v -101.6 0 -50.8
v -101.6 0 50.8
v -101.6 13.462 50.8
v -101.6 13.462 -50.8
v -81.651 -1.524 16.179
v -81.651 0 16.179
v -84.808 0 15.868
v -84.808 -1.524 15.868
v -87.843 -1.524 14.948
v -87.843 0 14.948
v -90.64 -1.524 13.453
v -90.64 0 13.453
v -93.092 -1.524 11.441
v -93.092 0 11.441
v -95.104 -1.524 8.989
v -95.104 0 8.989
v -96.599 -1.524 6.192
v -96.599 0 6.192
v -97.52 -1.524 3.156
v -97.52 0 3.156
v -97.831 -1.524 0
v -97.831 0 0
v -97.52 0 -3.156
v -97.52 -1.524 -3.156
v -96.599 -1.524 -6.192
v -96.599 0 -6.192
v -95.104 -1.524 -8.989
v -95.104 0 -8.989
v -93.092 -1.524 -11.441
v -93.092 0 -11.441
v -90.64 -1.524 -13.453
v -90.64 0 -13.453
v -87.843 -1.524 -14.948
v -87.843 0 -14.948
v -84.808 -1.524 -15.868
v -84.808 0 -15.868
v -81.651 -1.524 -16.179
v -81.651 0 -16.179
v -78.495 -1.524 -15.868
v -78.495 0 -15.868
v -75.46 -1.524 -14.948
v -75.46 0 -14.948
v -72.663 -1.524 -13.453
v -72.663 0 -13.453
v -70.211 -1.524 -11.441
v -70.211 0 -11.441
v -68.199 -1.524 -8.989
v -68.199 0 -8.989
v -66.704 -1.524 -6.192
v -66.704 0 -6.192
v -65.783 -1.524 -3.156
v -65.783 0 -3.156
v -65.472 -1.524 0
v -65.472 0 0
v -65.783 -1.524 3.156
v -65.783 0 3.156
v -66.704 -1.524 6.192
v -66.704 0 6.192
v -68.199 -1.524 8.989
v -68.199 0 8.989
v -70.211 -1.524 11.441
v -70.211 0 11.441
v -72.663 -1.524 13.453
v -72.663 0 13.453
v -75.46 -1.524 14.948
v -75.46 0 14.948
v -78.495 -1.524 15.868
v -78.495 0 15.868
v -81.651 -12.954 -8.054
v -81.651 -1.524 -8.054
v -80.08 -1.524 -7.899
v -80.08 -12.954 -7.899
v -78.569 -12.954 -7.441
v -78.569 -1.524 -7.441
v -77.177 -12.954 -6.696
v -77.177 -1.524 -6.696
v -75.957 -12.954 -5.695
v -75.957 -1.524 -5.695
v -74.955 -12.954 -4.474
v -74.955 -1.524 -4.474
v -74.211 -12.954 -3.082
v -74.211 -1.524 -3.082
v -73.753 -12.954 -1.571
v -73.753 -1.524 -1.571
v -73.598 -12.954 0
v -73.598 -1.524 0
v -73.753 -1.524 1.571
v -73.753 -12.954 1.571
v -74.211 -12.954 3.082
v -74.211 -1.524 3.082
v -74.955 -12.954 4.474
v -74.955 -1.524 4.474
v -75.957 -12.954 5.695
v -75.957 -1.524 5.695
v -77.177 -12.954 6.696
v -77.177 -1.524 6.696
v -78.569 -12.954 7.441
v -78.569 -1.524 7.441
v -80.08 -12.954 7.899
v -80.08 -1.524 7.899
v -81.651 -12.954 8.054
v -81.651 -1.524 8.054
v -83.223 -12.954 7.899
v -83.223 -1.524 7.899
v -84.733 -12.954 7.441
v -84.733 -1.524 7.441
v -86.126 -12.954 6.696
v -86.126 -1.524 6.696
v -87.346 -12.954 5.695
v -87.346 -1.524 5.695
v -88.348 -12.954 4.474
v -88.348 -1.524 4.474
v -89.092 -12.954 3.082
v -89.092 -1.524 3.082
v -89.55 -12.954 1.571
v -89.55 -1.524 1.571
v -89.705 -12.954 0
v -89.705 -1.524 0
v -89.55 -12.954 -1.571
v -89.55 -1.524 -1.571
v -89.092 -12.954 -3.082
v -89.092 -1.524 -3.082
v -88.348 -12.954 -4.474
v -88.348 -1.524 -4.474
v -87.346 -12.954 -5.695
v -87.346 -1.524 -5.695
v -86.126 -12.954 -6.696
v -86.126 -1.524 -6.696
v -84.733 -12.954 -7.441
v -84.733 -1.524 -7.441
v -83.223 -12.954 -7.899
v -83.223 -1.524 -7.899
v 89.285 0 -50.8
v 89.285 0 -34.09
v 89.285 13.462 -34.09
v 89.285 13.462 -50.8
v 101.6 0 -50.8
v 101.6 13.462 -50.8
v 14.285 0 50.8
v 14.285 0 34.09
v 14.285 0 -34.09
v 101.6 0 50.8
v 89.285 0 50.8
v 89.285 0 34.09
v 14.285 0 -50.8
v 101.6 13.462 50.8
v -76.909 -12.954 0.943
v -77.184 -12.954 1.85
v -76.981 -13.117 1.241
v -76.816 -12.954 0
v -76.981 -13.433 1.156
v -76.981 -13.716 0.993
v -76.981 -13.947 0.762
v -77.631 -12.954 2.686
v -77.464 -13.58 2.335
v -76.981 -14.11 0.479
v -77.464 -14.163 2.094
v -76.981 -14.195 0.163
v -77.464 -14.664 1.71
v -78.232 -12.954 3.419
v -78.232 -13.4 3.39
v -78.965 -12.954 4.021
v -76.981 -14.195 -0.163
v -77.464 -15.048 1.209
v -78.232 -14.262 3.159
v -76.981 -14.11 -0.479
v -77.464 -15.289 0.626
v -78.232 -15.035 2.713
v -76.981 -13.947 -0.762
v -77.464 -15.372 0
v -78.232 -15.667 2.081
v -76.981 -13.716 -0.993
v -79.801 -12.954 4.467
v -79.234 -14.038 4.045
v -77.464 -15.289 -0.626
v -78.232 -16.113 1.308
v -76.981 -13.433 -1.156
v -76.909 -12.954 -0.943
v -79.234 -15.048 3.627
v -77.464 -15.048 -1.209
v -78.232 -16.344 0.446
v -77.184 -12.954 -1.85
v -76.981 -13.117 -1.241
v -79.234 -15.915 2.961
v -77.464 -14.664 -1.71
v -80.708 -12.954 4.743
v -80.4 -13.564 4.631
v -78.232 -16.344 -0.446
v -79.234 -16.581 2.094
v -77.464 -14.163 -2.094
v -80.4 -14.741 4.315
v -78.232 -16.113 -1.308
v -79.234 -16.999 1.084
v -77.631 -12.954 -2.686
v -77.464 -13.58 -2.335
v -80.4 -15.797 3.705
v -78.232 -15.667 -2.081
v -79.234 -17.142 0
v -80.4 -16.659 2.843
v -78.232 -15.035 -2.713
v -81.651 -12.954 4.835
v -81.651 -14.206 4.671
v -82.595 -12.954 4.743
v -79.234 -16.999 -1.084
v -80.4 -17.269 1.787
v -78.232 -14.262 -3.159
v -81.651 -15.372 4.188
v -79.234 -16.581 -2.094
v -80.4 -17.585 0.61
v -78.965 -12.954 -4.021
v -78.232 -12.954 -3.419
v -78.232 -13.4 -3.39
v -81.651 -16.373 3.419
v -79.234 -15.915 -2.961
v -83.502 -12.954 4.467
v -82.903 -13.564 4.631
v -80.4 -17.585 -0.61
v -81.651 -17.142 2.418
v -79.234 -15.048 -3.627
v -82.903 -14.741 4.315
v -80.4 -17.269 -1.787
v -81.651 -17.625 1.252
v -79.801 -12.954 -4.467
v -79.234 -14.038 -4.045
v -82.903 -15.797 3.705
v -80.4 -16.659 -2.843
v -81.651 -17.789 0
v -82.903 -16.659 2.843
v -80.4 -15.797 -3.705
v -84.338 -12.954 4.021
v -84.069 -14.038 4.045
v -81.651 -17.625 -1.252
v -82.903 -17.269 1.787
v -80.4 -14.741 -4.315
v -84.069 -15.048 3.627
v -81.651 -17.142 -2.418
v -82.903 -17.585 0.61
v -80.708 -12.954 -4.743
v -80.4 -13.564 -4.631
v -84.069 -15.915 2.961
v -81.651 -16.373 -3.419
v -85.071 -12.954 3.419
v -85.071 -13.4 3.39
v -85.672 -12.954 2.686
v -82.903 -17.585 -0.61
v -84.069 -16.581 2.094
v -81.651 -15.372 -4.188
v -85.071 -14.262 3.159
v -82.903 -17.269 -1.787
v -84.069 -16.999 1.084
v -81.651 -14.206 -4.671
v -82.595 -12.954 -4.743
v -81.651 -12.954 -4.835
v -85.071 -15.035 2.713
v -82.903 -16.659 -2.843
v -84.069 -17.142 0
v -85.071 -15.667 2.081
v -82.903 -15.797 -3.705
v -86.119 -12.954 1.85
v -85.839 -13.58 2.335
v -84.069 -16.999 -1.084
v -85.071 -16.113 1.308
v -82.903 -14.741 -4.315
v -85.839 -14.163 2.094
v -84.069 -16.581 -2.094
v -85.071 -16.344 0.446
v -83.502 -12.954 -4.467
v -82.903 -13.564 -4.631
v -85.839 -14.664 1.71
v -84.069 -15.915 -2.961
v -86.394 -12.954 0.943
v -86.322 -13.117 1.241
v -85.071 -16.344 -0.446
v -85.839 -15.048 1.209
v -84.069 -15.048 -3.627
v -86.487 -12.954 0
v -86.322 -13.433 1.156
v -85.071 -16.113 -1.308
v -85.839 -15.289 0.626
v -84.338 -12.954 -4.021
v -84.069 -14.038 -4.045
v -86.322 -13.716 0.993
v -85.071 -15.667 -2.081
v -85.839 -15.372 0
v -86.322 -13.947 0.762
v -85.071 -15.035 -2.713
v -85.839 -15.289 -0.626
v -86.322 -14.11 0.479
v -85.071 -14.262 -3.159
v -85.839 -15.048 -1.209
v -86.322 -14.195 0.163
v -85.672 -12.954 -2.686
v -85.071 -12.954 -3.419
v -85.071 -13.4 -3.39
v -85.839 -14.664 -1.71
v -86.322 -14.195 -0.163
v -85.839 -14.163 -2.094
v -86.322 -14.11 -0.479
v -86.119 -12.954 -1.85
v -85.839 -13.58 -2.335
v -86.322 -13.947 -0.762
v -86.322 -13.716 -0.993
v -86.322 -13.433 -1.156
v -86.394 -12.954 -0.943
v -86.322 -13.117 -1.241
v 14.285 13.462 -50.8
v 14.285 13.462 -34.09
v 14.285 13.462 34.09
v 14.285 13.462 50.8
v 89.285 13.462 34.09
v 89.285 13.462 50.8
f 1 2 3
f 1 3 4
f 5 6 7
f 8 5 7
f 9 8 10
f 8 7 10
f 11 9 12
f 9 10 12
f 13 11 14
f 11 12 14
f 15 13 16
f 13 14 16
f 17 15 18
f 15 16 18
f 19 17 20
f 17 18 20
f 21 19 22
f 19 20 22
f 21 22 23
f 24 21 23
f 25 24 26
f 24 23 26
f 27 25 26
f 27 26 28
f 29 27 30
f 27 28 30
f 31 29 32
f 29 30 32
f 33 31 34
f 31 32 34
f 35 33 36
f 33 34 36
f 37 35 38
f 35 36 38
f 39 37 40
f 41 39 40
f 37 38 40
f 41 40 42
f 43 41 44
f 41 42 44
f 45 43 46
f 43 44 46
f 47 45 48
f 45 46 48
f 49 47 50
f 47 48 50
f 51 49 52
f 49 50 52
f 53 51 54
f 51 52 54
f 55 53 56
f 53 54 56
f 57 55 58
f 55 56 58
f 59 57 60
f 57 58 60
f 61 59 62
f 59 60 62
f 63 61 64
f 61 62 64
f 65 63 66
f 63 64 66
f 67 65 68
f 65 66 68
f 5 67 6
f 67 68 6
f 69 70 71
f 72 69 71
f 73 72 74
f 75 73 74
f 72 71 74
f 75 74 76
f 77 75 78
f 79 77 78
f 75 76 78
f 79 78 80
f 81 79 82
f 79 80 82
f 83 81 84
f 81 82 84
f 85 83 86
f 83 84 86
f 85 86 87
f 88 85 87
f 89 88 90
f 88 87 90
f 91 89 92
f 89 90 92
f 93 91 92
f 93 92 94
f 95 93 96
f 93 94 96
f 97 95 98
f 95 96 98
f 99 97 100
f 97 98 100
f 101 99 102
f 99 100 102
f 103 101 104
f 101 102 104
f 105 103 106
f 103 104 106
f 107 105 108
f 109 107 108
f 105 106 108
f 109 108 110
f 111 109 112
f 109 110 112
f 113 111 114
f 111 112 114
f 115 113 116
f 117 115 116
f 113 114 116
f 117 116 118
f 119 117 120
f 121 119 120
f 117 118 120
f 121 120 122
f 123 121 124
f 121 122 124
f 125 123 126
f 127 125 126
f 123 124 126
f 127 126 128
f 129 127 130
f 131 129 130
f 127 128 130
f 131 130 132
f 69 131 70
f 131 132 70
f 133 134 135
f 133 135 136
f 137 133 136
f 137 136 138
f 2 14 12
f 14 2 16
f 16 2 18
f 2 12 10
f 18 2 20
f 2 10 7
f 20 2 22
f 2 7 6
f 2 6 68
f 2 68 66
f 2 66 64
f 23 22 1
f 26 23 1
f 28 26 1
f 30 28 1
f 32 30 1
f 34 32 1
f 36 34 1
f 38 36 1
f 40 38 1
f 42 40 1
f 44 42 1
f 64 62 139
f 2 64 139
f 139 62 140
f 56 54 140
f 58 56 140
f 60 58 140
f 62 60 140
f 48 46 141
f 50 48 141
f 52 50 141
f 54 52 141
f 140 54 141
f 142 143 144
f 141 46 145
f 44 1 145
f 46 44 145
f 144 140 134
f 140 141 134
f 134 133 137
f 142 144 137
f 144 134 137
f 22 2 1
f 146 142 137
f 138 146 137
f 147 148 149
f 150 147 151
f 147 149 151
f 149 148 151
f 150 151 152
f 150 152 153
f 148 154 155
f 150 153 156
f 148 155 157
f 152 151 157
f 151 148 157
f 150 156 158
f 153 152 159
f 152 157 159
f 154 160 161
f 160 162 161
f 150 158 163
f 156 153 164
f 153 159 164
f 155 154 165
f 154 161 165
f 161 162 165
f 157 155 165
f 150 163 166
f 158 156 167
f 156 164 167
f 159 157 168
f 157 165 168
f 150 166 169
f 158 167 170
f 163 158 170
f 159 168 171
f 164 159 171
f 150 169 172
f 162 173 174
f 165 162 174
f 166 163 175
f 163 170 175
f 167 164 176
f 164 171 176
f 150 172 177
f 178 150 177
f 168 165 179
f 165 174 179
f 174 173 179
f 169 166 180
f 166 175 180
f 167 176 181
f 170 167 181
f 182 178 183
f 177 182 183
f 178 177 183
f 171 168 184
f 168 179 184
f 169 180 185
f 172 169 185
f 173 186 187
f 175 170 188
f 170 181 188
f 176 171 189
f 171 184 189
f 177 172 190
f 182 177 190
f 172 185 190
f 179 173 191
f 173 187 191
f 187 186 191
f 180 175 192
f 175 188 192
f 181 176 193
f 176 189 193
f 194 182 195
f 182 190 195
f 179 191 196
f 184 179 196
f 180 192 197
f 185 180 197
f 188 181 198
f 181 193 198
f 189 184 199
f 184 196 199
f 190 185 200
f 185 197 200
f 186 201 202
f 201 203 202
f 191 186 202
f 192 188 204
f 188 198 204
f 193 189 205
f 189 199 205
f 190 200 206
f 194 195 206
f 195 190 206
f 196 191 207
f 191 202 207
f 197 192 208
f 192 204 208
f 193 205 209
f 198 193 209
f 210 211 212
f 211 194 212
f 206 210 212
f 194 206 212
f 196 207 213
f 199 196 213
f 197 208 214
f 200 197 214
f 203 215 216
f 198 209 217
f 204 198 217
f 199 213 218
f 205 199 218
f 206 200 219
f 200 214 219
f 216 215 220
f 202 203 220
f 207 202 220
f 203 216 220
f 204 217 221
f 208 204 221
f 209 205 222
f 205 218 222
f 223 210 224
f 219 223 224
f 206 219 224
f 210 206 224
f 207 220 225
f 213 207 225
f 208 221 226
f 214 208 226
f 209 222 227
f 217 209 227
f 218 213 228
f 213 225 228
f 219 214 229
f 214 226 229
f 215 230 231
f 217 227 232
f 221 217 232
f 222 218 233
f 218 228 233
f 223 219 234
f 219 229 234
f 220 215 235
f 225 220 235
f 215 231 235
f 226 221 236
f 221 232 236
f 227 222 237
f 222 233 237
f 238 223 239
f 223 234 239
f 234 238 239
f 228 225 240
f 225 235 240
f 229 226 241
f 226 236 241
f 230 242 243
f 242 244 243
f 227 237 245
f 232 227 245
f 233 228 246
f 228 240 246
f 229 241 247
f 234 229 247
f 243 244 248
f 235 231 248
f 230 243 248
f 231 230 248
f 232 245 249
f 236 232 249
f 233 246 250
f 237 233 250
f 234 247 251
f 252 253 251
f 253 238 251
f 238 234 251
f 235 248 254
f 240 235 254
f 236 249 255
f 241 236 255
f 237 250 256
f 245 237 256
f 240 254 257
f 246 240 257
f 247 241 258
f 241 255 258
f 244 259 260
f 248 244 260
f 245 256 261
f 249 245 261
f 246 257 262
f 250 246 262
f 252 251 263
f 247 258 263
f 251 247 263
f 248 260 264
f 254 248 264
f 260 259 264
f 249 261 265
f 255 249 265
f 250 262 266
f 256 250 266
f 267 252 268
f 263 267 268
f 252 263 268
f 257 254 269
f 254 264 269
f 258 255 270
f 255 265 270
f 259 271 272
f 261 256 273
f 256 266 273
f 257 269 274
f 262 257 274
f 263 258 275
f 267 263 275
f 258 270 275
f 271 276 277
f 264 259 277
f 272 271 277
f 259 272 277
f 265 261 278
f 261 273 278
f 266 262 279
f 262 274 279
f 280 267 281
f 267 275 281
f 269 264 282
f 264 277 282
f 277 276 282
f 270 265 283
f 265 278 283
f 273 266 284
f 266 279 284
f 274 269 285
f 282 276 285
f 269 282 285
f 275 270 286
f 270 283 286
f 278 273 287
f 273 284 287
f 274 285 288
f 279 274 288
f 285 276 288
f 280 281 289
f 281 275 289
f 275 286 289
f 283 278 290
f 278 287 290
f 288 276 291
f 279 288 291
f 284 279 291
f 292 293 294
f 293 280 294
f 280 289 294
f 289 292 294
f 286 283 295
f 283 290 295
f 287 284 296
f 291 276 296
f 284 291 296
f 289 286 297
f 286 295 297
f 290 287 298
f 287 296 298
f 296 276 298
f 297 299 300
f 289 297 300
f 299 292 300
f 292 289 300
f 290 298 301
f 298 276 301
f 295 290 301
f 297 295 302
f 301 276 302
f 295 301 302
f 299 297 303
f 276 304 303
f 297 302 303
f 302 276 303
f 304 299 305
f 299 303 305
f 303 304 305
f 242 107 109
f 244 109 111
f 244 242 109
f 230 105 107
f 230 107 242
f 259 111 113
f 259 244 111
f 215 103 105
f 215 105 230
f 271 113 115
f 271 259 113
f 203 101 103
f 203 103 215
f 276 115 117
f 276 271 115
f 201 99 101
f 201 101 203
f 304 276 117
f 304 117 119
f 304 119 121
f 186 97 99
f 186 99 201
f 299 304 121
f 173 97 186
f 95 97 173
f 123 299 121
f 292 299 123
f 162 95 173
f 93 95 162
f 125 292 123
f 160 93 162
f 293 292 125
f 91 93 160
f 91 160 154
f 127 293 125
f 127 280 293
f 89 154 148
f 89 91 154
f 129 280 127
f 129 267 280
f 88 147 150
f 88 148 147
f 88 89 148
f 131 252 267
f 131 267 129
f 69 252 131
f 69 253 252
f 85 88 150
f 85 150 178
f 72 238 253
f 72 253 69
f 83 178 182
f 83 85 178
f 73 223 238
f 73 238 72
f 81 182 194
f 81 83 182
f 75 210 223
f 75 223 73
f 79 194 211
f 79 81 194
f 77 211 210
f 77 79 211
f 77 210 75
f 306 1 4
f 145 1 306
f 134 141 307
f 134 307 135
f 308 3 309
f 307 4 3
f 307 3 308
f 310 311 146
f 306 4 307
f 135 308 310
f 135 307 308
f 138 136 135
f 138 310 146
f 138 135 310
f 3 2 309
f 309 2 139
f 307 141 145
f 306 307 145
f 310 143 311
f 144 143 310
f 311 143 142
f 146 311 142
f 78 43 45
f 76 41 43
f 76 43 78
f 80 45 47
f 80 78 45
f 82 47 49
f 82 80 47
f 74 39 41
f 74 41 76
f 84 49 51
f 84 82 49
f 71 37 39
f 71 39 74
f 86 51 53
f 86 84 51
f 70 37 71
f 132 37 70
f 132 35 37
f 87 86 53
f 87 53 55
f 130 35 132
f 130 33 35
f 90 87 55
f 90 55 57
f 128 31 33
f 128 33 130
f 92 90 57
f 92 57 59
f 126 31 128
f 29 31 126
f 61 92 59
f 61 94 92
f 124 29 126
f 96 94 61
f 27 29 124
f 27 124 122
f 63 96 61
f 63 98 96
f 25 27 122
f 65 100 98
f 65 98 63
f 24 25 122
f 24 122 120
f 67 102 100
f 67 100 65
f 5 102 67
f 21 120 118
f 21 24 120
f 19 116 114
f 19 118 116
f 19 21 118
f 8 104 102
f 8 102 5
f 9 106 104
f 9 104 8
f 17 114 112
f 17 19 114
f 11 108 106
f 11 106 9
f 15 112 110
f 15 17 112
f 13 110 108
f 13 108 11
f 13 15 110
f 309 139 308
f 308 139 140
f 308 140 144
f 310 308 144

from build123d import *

# Parameters (mm, degrees)
SKETCH1_W               = 203.2
SKETCH1_H               = 101.6
BOSS_EXTRUDE2_DEPTH     = 13.462
CUT_EXTRUDE1_DEPTH      = 13.208
CUT_EXTRUDE1_DEPTH_BACK = 28.448
SKETCH4_W               = 75
SKETCH4_H               = 23.376263875
SKETCH5_R               = 16.179381977
BOSS_EXTRUDE4_DEPTH     = 1.524
SKETCH6_R               = 8.05355352
BOSS_EXTRUDE6_DEPTH     = 11.43


with BuildPart() as part:
    # Sketch1 → Boss-Extrude2 (new body)
    with BuildSketch(Plane(origin=(0, 0, 0), x_dir=(1, 0, 0), z_dir=(0, 1, 0))):
        Rectangle(SKETCH1_W, SKETCH1_H)
    extrude(amount=BOSS_EXTRUDE2_DEPTH)

    # Sketch4 → Cut-Extrude1 (cut, two sides: drawn at the far end of the back side and taken through both)
    with BuildSketch(Plane(origin=(0, 13.462, 0), x_dir=(1, 0, 0), z_dir=(0, 1, 0)).offset(-CUT_EXTRUDE1_DEPTH_BACK)):
        with Locations((51.78549459, -45.778516755)):
            Rectangle(SKETCH4_W, SKETCH4_H)
        with Locations((51.78549459, 45.778516755)):
            Rectangle(SKETCH4_W, SKETCH4_H)
    extrude(amount=CUT_EXTRUDE1_DEPTH + CUT_EXTRUDE1_DEPTH_BACK, mode=Mode.SUBTRACT)

    # Sketch5 → Boss-Extrude4 (add)
    with BuildSketch(Plane(origin=(0, 0, 0), x_dir=(-1, 0, 0), z_dir=(0, -1, 0))):
        with Locations(Location((81.651405353, 0, 0), (0, 0, 270))):
            Circle(SKETCH5_R)
    extrude(amount=BOSS_EXTRUDE4_DEPTH)

    # Sketch6 → Boss-Extrude6 (add)
    with BuildSketch(Plane.XZ.offset(1.524)):
        with Locations(Location((-81.651405353, 0, 0), (0, 0, 270))):
            Circle(SKETCH6_R)
    extrude(amount=BOSS_EXTRUDE6_DEPTH)

    # Sketch7 → Revolve1 (revolve)
    with BuildSketch(Plane.XZ.offset(12.954)):
        with BuildLine():
            Line((-86.486836617, 0), (-76.815974088, 0))
            ThreePointArc((-76.815974088, 0), (-81.651405353, 4.835431264), (-86.486836617, 0))
        make_face()
    revolve(axis=Axis((-86.486836617, -12.954, 0), (1, 0, 0)))


solid = part.part
